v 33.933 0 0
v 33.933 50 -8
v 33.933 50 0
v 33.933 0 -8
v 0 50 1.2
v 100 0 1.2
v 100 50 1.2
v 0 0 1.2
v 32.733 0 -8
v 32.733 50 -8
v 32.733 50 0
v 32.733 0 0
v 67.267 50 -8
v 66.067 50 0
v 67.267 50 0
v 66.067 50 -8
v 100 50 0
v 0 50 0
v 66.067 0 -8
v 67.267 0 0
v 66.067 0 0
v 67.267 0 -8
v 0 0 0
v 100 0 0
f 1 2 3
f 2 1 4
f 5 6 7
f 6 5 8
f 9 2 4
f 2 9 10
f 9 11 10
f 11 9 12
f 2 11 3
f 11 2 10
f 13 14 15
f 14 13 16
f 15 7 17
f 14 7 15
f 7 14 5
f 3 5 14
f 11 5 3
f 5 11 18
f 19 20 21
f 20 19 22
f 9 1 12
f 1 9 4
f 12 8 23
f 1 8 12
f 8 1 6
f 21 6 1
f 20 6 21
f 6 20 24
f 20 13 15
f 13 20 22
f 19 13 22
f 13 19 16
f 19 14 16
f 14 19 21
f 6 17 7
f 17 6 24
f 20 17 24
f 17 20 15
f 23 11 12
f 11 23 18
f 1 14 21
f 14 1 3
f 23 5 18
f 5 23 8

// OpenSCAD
$fn = 32;

// ----------------------------------------------------------------------
// Ribbed panel: 1.2 mm panel
// ----------------------------------------------------------------------

// --- parameters (mm) ---
panel_l = 100;            // panel length, X
panel_w = 50;             // panel width, Y
panel_t = 1.2;            // panel thickness, Z
rib_t = 1.2;              // rib thickness
rib_h = 8;                // rib height below the panel
ribs = 2;                 // number of ribs
fit_tol = 0.1;            // tolerance for press fits, mm
free_tol = 0.3;           // tolerance for clearance fits, mm

total_h = panel_t + rib_h;  // overall height

union() {
  cube([panel_l, panel_w, panel_t]);
  for (i = [1 : ribs])
    translate([i * panel_l / (ribs + 1) - rib_t / 2, 0, -rib_h])
      cube([rib_t, panel_w, rib_h + panel_t]);
}
